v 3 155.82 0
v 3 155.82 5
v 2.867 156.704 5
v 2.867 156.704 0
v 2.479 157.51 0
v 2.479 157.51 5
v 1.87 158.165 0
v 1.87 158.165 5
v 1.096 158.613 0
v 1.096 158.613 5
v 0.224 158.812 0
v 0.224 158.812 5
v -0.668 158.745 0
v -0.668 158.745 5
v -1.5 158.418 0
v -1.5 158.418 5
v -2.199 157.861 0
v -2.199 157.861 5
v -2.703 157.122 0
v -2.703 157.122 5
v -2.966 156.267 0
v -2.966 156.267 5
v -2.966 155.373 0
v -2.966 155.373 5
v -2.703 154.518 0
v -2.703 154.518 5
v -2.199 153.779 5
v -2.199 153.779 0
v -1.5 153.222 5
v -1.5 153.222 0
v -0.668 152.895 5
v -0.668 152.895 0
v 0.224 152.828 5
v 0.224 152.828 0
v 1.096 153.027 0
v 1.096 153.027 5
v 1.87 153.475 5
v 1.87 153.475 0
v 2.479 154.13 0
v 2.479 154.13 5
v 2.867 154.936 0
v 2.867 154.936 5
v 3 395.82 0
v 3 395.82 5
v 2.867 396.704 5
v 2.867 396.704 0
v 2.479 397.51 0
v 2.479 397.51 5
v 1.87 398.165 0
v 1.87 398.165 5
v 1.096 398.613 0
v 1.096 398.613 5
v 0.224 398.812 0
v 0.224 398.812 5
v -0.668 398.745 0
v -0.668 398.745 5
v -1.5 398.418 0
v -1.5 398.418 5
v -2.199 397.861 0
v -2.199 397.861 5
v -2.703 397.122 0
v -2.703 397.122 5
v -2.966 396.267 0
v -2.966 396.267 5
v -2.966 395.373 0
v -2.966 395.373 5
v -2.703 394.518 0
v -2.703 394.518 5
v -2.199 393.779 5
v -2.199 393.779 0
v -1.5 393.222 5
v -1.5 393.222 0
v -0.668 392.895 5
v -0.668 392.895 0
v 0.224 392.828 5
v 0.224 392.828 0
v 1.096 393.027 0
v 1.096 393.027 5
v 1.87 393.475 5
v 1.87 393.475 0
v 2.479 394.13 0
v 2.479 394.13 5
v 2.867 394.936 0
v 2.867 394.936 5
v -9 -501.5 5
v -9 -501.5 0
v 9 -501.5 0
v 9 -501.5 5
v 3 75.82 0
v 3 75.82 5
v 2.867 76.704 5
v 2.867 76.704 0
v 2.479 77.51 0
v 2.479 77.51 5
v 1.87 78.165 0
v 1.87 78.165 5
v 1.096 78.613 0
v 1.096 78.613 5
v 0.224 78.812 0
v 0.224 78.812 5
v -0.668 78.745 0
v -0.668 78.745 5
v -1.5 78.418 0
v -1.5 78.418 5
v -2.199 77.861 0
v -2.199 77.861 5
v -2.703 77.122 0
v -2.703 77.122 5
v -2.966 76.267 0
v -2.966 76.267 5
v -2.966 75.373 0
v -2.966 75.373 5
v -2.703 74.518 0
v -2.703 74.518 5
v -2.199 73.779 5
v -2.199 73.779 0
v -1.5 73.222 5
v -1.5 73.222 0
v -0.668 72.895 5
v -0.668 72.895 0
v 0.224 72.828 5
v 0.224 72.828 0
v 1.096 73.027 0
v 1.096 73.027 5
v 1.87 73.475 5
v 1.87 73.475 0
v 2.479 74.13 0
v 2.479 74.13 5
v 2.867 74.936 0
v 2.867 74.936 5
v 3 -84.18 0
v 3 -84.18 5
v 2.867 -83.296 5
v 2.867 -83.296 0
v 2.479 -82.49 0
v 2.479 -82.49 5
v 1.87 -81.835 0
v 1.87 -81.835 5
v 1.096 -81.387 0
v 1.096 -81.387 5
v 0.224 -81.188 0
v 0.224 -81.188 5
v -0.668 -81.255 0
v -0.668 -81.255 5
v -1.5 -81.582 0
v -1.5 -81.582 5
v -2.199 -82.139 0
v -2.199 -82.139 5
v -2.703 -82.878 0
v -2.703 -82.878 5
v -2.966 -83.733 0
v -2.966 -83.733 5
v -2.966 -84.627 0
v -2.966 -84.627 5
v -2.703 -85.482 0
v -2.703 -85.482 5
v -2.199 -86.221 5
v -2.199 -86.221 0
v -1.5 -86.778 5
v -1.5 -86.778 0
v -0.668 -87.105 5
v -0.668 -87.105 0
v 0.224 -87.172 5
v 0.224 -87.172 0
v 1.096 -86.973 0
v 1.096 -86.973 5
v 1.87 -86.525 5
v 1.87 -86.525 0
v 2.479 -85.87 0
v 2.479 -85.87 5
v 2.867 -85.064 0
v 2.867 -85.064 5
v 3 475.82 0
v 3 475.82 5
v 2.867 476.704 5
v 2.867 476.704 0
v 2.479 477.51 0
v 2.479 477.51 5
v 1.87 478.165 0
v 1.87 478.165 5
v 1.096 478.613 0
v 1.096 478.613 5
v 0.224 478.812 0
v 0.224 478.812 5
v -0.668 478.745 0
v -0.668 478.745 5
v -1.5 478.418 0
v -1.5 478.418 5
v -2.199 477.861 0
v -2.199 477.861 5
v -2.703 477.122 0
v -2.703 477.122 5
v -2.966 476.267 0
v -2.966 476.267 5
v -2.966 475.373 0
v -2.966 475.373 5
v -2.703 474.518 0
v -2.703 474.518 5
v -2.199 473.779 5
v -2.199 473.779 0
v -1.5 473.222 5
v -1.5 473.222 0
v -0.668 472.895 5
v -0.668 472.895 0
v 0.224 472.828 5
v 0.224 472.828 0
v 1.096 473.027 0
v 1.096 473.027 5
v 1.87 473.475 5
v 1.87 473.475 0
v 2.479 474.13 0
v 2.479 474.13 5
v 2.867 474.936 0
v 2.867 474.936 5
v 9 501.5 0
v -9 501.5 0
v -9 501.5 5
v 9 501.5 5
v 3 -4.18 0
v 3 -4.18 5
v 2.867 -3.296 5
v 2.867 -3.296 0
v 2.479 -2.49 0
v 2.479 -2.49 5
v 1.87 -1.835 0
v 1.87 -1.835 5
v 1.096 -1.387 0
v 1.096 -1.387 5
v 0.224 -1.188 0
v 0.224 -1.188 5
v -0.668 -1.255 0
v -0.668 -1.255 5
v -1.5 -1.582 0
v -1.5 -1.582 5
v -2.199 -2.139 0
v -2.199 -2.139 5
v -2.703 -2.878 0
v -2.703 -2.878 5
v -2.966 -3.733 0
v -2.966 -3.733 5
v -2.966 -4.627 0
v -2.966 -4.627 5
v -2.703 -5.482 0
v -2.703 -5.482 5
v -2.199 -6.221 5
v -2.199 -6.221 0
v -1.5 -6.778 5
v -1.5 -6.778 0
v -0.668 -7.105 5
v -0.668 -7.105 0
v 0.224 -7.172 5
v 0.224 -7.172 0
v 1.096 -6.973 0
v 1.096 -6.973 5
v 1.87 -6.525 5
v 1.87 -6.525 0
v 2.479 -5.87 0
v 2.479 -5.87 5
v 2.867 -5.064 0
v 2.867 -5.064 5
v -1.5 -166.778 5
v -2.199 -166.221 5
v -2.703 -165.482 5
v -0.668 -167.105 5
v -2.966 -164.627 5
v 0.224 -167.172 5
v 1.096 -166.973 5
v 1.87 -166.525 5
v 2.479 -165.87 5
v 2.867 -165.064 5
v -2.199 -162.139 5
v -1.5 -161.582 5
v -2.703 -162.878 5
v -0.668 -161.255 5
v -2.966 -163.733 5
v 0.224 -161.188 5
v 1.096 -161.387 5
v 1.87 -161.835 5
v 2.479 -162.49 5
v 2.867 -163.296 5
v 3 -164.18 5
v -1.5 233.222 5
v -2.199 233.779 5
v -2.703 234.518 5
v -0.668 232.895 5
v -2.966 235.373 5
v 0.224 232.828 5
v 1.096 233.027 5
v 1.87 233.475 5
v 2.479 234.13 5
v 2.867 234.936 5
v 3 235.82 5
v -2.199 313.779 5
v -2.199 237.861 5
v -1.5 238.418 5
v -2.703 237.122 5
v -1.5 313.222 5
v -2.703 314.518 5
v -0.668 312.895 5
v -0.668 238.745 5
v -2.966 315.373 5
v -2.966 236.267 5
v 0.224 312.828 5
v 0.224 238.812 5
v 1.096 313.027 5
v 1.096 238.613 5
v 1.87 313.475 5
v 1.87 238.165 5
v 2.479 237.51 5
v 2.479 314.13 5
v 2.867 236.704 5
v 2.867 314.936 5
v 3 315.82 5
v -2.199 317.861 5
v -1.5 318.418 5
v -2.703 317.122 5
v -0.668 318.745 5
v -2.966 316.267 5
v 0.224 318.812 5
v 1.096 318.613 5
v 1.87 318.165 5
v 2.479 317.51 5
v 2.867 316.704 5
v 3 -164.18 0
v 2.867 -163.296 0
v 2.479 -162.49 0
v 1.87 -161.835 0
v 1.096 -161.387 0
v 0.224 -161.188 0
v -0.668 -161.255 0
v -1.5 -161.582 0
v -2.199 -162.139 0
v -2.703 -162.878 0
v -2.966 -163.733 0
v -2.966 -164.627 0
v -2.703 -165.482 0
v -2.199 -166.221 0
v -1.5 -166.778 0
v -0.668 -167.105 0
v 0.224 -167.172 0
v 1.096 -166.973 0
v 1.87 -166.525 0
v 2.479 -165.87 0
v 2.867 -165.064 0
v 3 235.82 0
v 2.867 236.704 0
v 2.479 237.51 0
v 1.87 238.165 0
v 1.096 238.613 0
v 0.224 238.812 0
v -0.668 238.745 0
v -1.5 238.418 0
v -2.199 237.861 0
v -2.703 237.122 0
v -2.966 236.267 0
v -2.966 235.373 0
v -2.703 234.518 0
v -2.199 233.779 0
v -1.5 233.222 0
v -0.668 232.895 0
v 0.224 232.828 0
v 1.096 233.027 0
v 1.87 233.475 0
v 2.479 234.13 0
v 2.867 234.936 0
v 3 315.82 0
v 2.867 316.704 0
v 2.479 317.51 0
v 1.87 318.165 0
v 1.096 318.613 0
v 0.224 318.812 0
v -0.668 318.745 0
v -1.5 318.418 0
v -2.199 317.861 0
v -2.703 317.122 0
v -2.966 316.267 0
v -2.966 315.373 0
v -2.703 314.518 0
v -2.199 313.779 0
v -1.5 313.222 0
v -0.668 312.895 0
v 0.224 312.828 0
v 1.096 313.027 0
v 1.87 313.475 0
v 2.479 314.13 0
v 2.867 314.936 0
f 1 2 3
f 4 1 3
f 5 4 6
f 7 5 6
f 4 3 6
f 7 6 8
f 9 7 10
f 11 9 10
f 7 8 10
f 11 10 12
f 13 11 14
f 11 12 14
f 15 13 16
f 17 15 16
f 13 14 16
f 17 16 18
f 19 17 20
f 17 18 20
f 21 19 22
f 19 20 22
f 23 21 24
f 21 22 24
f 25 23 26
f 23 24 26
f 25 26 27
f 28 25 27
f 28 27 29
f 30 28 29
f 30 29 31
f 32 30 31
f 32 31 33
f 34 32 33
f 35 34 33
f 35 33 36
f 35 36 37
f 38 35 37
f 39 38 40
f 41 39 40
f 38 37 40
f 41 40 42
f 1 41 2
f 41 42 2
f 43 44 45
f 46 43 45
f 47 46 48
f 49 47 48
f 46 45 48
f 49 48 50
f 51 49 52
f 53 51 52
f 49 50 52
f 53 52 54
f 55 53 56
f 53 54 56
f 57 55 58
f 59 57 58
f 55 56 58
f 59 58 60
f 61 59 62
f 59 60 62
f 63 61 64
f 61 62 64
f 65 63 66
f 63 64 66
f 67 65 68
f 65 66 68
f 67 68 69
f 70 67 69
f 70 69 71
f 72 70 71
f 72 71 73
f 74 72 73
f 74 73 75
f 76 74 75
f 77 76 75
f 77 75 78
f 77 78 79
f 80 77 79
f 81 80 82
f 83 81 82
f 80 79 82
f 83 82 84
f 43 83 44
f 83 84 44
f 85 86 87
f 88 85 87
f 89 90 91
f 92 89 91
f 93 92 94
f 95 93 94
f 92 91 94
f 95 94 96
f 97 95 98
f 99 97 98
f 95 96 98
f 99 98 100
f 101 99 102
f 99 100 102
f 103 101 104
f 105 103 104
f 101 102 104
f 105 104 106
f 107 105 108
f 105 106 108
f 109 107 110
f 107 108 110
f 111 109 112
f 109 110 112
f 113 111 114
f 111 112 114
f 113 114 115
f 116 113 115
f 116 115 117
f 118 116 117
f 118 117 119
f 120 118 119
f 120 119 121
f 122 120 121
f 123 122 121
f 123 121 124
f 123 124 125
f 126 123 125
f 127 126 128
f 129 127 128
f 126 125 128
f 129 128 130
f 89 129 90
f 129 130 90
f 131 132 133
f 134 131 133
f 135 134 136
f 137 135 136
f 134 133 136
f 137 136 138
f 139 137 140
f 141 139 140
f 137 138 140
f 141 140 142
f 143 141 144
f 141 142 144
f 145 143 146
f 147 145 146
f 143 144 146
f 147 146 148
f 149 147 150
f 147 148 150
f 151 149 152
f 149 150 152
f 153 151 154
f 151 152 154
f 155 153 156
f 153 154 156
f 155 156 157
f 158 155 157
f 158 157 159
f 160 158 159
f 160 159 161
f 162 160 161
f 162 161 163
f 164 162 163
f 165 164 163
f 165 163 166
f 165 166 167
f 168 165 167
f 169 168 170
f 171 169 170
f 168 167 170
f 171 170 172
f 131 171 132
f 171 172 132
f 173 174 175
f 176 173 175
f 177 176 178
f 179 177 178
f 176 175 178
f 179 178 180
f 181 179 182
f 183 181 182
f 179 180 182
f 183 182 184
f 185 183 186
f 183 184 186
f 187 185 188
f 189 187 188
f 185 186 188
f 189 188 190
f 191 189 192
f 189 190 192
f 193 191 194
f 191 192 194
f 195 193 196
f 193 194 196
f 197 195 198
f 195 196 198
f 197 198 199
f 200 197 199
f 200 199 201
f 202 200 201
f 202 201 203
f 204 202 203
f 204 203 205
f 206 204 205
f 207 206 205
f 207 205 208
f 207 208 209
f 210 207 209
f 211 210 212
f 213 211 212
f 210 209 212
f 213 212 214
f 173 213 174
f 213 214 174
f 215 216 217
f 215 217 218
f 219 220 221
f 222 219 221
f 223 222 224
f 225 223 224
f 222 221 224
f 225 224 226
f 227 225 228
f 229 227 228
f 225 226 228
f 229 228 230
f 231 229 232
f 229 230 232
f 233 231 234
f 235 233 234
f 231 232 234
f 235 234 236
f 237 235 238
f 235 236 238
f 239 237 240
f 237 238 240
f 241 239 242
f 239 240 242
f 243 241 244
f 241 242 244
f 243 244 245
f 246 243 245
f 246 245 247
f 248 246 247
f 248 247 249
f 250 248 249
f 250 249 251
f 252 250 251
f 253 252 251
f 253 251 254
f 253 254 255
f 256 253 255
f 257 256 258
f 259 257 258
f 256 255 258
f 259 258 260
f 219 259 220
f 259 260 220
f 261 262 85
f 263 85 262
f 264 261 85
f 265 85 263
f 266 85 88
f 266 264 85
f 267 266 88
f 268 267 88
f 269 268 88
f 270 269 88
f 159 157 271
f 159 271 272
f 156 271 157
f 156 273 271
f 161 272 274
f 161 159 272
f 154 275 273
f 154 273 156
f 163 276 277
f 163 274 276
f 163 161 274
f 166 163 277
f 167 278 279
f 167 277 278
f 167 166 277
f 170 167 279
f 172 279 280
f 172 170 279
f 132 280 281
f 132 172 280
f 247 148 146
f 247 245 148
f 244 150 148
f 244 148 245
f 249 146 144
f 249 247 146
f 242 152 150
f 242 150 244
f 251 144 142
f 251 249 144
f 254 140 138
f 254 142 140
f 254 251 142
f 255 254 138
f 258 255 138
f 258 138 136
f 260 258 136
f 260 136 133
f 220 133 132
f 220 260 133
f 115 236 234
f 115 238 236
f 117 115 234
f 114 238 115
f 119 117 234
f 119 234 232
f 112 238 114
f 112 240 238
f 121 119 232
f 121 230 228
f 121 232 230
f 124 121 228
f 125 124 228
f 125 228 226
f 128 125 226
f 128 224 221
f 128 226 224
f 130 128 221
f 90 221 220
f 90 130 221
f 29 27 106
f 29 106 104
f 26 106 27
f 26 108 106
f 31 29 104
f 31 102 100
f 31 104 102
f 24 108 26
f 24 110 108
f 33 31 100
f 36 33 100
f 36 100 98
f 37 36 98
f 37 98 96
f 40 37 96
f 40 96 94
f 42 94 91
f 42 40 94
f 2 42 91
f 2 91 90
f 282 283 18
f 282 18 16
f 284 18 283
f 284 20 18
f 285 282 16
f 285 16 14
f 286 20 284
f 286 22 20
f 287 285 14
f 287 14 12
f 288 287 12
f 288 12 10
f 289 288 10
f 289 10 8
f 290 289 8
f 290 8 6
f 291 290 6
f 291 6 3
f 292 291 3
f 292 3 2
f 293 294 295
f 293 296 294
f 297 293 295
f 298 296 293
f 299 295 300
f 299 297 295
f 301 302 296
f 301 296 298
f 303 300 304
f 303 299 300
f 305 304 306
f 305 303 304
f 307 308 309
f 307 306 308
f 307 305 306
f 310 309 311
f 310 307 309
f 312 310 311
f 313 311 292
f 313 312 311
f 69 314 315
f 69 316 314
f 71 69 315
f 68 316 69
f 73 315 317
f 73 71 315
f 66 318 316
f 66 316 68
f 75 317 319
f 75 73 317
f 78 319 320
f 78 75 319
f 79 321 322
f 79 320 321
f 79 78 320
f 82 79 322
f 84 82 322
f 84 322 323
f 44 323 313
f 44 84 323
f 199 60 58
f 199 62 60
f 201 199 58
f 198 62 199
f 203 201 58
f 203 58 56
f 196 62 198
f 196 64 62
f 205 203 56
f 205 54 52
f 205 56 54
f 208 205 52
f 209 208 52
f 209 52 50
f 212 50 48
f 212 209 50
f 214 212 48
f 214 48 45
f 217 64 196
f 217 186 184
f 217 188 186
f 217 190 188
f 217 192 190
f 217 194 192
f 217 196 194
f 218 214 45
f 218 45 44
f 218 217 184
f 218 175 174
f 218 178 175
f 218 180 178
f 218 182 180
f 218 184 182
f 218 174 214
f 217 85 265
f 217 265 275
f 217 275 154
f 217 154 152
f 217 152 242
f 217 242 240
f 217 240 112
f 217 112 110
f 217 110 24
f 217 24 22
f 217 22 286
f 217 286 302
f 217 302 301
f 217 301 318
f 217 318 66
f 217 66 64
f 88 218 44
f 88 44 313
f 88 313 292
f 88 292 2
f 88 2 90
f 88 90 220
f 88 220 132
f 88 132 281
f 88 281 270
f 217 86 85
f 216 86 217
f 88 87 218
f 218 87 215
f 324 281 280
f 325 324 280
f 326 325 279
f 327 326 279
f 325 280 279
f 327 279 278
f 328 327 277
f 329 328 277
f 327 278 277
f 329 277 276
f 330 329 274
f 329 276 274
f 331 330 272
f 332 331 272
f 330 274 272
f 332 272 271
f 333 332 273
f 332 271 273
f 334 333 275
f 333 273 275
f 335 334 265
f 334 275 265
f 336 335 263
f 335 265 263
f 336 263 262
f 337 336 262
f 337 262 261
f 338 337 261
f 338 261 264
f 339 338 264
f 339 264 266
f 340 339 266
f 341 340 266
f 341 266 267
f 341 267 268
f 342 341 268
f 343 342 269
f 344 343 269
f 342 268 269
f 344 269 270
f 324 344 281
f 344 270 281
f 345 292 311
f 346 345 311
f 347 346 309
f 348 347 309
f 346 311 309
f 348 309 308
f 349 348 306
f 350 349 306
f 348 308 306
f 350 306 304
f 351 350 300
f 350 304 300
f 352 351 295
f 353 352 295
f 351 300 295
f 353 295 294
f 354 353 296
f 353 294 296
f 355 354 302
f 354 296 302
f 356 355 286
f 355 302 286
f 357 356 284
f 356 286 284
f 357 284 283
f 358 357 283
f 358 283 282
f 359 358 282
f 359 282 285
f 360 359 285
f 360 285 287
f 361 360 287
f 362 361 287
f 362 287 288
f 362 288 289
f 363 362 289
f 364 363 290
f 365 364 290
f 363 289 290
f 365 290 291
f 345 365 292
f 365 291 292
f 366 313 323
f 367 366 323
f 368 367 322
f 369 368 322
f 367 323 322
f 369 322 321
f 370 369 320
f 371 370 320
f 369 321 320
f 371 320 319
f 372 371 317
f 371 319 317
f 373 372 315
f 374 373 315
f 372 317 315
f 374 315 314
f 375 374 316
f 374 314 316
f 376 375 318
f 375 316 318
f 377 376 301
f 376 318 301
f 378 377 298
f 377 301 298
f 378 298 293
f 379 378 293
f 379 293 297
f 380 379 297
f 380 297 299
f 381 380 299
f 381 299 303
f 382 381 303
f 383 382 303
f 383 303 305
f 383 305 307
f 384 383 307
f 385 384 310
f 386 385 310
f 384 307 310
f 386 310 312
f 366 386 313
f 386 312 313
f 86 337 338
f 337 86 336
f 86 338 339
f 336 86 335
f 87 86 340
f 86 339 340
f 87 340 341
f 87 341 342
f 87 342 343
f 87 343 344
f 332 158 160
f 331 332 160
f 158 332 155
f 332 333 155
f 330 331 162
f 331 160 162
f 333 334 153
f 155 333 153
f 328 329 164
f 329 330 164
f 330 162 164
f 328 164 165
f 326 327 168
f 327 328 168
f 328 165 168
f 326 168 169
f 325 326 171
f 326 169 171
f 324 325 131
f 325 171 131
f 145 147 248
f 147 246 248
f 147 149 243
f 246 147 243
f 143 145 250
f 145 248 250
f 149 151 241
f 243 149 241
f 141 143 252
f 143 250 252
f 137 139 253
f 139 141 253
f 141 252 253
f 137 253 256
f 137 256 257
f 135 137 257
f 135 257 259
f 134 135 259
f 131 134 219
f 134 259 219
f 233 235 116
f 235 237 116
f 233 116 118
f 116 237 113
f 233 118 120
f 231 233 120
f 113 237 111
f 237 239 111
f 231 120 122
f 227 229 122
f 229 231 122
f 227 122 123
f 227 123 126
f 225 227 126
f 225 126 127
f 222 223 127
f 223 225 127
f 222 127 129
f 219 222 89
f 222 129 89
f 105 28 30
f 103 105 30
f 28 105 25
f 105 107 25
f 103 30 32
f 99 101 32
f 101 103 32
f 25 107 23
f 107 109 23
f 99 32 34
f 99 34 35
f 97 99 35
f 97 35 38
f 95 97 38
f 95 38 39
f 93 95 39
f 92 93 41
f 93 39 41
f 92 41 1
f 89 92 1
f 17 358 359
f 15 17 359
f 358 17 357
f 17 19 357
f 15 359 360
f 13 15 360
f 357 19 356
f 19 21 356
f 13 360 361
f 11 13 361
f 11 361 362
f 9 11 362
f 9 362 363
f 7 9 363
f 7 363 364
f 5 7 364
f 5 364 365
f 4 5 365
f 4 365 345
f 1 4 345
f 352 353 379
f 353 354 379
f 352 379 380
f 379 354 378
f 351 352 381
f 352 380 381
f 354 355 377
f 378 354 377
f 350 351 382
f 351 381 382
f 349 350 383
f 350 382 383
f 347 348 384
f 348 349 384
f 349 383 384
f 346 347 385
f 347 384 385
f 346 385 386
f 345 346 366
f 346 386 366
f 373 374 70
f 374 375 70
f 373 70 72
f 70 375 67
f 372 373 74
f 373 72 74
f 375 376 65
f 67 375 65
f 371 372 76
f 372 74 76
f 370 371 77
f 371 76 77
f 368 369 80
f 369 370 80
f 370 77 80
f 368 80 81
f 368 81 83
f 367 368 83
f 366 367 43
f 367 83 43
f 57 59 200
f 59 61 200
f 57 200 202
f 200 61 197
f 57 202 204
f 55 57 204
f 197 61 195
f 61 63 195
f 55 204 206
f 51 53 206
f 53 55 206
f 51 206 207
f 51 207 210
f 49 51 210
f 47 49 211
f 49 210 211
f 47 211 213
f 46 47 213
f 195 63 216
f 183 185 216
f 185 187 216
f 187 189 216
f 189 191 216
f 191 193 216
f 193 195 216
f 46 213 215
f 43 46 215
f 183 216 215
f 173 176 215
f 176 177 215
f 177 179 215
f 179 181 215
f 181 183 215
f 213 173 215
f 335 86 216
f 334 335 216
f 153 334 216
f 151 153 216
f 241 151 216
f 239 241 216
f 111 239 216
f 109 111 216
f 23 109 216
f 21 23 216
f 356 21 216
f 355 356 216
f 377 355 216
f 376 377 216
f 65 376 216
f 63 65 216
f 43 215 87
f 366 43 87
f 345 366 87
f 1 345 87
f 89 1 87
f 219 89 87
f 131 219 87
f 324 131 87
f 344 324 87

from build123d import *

# Parameters (mm, degrees)
SKETCH1_W           = 18
SKETCH1_H           = 1003
BOSS_EXTRUDE1_DEPTH = 5
SKETCH2_R           = 3
CUT_EXTRUDE1_DEPTH  = 5
LPATTERN1_COUNT     = 9
LPATTERN1_PITCH     = 80


with BuildPart() as part:
    # Sketch1 → Boss-Extrude1 (new body)
    with BuildSketch(Plane.XY):
        Rectangle(SKETCH1_W, SKETCH1_H)
    extrude(amount=BOSS_EXTRUDE1_DEPTH)

    # Sketch2 → Cut-Extrude1 (cut)
    with BuildSketch(Plane.XY.offset(5)):
        with Locations((0, 475.82)):
            Circle(SKETCH2_R)
    cut_extrude1 = extrude(amount=-CUT_EXTRUDE1_DEPTH, mode=Mode.SUBTRACT)

    # LPattern1: Cut-Extrude1 ×9
    with Locations(*[(0, -i * LPATTERN1_PITCH, 0) for i in range(1, LPATTERN1_COUNT)]):
        add(cut_extrude1, mode=Mode.SUBTRACT)


solid = part.part
